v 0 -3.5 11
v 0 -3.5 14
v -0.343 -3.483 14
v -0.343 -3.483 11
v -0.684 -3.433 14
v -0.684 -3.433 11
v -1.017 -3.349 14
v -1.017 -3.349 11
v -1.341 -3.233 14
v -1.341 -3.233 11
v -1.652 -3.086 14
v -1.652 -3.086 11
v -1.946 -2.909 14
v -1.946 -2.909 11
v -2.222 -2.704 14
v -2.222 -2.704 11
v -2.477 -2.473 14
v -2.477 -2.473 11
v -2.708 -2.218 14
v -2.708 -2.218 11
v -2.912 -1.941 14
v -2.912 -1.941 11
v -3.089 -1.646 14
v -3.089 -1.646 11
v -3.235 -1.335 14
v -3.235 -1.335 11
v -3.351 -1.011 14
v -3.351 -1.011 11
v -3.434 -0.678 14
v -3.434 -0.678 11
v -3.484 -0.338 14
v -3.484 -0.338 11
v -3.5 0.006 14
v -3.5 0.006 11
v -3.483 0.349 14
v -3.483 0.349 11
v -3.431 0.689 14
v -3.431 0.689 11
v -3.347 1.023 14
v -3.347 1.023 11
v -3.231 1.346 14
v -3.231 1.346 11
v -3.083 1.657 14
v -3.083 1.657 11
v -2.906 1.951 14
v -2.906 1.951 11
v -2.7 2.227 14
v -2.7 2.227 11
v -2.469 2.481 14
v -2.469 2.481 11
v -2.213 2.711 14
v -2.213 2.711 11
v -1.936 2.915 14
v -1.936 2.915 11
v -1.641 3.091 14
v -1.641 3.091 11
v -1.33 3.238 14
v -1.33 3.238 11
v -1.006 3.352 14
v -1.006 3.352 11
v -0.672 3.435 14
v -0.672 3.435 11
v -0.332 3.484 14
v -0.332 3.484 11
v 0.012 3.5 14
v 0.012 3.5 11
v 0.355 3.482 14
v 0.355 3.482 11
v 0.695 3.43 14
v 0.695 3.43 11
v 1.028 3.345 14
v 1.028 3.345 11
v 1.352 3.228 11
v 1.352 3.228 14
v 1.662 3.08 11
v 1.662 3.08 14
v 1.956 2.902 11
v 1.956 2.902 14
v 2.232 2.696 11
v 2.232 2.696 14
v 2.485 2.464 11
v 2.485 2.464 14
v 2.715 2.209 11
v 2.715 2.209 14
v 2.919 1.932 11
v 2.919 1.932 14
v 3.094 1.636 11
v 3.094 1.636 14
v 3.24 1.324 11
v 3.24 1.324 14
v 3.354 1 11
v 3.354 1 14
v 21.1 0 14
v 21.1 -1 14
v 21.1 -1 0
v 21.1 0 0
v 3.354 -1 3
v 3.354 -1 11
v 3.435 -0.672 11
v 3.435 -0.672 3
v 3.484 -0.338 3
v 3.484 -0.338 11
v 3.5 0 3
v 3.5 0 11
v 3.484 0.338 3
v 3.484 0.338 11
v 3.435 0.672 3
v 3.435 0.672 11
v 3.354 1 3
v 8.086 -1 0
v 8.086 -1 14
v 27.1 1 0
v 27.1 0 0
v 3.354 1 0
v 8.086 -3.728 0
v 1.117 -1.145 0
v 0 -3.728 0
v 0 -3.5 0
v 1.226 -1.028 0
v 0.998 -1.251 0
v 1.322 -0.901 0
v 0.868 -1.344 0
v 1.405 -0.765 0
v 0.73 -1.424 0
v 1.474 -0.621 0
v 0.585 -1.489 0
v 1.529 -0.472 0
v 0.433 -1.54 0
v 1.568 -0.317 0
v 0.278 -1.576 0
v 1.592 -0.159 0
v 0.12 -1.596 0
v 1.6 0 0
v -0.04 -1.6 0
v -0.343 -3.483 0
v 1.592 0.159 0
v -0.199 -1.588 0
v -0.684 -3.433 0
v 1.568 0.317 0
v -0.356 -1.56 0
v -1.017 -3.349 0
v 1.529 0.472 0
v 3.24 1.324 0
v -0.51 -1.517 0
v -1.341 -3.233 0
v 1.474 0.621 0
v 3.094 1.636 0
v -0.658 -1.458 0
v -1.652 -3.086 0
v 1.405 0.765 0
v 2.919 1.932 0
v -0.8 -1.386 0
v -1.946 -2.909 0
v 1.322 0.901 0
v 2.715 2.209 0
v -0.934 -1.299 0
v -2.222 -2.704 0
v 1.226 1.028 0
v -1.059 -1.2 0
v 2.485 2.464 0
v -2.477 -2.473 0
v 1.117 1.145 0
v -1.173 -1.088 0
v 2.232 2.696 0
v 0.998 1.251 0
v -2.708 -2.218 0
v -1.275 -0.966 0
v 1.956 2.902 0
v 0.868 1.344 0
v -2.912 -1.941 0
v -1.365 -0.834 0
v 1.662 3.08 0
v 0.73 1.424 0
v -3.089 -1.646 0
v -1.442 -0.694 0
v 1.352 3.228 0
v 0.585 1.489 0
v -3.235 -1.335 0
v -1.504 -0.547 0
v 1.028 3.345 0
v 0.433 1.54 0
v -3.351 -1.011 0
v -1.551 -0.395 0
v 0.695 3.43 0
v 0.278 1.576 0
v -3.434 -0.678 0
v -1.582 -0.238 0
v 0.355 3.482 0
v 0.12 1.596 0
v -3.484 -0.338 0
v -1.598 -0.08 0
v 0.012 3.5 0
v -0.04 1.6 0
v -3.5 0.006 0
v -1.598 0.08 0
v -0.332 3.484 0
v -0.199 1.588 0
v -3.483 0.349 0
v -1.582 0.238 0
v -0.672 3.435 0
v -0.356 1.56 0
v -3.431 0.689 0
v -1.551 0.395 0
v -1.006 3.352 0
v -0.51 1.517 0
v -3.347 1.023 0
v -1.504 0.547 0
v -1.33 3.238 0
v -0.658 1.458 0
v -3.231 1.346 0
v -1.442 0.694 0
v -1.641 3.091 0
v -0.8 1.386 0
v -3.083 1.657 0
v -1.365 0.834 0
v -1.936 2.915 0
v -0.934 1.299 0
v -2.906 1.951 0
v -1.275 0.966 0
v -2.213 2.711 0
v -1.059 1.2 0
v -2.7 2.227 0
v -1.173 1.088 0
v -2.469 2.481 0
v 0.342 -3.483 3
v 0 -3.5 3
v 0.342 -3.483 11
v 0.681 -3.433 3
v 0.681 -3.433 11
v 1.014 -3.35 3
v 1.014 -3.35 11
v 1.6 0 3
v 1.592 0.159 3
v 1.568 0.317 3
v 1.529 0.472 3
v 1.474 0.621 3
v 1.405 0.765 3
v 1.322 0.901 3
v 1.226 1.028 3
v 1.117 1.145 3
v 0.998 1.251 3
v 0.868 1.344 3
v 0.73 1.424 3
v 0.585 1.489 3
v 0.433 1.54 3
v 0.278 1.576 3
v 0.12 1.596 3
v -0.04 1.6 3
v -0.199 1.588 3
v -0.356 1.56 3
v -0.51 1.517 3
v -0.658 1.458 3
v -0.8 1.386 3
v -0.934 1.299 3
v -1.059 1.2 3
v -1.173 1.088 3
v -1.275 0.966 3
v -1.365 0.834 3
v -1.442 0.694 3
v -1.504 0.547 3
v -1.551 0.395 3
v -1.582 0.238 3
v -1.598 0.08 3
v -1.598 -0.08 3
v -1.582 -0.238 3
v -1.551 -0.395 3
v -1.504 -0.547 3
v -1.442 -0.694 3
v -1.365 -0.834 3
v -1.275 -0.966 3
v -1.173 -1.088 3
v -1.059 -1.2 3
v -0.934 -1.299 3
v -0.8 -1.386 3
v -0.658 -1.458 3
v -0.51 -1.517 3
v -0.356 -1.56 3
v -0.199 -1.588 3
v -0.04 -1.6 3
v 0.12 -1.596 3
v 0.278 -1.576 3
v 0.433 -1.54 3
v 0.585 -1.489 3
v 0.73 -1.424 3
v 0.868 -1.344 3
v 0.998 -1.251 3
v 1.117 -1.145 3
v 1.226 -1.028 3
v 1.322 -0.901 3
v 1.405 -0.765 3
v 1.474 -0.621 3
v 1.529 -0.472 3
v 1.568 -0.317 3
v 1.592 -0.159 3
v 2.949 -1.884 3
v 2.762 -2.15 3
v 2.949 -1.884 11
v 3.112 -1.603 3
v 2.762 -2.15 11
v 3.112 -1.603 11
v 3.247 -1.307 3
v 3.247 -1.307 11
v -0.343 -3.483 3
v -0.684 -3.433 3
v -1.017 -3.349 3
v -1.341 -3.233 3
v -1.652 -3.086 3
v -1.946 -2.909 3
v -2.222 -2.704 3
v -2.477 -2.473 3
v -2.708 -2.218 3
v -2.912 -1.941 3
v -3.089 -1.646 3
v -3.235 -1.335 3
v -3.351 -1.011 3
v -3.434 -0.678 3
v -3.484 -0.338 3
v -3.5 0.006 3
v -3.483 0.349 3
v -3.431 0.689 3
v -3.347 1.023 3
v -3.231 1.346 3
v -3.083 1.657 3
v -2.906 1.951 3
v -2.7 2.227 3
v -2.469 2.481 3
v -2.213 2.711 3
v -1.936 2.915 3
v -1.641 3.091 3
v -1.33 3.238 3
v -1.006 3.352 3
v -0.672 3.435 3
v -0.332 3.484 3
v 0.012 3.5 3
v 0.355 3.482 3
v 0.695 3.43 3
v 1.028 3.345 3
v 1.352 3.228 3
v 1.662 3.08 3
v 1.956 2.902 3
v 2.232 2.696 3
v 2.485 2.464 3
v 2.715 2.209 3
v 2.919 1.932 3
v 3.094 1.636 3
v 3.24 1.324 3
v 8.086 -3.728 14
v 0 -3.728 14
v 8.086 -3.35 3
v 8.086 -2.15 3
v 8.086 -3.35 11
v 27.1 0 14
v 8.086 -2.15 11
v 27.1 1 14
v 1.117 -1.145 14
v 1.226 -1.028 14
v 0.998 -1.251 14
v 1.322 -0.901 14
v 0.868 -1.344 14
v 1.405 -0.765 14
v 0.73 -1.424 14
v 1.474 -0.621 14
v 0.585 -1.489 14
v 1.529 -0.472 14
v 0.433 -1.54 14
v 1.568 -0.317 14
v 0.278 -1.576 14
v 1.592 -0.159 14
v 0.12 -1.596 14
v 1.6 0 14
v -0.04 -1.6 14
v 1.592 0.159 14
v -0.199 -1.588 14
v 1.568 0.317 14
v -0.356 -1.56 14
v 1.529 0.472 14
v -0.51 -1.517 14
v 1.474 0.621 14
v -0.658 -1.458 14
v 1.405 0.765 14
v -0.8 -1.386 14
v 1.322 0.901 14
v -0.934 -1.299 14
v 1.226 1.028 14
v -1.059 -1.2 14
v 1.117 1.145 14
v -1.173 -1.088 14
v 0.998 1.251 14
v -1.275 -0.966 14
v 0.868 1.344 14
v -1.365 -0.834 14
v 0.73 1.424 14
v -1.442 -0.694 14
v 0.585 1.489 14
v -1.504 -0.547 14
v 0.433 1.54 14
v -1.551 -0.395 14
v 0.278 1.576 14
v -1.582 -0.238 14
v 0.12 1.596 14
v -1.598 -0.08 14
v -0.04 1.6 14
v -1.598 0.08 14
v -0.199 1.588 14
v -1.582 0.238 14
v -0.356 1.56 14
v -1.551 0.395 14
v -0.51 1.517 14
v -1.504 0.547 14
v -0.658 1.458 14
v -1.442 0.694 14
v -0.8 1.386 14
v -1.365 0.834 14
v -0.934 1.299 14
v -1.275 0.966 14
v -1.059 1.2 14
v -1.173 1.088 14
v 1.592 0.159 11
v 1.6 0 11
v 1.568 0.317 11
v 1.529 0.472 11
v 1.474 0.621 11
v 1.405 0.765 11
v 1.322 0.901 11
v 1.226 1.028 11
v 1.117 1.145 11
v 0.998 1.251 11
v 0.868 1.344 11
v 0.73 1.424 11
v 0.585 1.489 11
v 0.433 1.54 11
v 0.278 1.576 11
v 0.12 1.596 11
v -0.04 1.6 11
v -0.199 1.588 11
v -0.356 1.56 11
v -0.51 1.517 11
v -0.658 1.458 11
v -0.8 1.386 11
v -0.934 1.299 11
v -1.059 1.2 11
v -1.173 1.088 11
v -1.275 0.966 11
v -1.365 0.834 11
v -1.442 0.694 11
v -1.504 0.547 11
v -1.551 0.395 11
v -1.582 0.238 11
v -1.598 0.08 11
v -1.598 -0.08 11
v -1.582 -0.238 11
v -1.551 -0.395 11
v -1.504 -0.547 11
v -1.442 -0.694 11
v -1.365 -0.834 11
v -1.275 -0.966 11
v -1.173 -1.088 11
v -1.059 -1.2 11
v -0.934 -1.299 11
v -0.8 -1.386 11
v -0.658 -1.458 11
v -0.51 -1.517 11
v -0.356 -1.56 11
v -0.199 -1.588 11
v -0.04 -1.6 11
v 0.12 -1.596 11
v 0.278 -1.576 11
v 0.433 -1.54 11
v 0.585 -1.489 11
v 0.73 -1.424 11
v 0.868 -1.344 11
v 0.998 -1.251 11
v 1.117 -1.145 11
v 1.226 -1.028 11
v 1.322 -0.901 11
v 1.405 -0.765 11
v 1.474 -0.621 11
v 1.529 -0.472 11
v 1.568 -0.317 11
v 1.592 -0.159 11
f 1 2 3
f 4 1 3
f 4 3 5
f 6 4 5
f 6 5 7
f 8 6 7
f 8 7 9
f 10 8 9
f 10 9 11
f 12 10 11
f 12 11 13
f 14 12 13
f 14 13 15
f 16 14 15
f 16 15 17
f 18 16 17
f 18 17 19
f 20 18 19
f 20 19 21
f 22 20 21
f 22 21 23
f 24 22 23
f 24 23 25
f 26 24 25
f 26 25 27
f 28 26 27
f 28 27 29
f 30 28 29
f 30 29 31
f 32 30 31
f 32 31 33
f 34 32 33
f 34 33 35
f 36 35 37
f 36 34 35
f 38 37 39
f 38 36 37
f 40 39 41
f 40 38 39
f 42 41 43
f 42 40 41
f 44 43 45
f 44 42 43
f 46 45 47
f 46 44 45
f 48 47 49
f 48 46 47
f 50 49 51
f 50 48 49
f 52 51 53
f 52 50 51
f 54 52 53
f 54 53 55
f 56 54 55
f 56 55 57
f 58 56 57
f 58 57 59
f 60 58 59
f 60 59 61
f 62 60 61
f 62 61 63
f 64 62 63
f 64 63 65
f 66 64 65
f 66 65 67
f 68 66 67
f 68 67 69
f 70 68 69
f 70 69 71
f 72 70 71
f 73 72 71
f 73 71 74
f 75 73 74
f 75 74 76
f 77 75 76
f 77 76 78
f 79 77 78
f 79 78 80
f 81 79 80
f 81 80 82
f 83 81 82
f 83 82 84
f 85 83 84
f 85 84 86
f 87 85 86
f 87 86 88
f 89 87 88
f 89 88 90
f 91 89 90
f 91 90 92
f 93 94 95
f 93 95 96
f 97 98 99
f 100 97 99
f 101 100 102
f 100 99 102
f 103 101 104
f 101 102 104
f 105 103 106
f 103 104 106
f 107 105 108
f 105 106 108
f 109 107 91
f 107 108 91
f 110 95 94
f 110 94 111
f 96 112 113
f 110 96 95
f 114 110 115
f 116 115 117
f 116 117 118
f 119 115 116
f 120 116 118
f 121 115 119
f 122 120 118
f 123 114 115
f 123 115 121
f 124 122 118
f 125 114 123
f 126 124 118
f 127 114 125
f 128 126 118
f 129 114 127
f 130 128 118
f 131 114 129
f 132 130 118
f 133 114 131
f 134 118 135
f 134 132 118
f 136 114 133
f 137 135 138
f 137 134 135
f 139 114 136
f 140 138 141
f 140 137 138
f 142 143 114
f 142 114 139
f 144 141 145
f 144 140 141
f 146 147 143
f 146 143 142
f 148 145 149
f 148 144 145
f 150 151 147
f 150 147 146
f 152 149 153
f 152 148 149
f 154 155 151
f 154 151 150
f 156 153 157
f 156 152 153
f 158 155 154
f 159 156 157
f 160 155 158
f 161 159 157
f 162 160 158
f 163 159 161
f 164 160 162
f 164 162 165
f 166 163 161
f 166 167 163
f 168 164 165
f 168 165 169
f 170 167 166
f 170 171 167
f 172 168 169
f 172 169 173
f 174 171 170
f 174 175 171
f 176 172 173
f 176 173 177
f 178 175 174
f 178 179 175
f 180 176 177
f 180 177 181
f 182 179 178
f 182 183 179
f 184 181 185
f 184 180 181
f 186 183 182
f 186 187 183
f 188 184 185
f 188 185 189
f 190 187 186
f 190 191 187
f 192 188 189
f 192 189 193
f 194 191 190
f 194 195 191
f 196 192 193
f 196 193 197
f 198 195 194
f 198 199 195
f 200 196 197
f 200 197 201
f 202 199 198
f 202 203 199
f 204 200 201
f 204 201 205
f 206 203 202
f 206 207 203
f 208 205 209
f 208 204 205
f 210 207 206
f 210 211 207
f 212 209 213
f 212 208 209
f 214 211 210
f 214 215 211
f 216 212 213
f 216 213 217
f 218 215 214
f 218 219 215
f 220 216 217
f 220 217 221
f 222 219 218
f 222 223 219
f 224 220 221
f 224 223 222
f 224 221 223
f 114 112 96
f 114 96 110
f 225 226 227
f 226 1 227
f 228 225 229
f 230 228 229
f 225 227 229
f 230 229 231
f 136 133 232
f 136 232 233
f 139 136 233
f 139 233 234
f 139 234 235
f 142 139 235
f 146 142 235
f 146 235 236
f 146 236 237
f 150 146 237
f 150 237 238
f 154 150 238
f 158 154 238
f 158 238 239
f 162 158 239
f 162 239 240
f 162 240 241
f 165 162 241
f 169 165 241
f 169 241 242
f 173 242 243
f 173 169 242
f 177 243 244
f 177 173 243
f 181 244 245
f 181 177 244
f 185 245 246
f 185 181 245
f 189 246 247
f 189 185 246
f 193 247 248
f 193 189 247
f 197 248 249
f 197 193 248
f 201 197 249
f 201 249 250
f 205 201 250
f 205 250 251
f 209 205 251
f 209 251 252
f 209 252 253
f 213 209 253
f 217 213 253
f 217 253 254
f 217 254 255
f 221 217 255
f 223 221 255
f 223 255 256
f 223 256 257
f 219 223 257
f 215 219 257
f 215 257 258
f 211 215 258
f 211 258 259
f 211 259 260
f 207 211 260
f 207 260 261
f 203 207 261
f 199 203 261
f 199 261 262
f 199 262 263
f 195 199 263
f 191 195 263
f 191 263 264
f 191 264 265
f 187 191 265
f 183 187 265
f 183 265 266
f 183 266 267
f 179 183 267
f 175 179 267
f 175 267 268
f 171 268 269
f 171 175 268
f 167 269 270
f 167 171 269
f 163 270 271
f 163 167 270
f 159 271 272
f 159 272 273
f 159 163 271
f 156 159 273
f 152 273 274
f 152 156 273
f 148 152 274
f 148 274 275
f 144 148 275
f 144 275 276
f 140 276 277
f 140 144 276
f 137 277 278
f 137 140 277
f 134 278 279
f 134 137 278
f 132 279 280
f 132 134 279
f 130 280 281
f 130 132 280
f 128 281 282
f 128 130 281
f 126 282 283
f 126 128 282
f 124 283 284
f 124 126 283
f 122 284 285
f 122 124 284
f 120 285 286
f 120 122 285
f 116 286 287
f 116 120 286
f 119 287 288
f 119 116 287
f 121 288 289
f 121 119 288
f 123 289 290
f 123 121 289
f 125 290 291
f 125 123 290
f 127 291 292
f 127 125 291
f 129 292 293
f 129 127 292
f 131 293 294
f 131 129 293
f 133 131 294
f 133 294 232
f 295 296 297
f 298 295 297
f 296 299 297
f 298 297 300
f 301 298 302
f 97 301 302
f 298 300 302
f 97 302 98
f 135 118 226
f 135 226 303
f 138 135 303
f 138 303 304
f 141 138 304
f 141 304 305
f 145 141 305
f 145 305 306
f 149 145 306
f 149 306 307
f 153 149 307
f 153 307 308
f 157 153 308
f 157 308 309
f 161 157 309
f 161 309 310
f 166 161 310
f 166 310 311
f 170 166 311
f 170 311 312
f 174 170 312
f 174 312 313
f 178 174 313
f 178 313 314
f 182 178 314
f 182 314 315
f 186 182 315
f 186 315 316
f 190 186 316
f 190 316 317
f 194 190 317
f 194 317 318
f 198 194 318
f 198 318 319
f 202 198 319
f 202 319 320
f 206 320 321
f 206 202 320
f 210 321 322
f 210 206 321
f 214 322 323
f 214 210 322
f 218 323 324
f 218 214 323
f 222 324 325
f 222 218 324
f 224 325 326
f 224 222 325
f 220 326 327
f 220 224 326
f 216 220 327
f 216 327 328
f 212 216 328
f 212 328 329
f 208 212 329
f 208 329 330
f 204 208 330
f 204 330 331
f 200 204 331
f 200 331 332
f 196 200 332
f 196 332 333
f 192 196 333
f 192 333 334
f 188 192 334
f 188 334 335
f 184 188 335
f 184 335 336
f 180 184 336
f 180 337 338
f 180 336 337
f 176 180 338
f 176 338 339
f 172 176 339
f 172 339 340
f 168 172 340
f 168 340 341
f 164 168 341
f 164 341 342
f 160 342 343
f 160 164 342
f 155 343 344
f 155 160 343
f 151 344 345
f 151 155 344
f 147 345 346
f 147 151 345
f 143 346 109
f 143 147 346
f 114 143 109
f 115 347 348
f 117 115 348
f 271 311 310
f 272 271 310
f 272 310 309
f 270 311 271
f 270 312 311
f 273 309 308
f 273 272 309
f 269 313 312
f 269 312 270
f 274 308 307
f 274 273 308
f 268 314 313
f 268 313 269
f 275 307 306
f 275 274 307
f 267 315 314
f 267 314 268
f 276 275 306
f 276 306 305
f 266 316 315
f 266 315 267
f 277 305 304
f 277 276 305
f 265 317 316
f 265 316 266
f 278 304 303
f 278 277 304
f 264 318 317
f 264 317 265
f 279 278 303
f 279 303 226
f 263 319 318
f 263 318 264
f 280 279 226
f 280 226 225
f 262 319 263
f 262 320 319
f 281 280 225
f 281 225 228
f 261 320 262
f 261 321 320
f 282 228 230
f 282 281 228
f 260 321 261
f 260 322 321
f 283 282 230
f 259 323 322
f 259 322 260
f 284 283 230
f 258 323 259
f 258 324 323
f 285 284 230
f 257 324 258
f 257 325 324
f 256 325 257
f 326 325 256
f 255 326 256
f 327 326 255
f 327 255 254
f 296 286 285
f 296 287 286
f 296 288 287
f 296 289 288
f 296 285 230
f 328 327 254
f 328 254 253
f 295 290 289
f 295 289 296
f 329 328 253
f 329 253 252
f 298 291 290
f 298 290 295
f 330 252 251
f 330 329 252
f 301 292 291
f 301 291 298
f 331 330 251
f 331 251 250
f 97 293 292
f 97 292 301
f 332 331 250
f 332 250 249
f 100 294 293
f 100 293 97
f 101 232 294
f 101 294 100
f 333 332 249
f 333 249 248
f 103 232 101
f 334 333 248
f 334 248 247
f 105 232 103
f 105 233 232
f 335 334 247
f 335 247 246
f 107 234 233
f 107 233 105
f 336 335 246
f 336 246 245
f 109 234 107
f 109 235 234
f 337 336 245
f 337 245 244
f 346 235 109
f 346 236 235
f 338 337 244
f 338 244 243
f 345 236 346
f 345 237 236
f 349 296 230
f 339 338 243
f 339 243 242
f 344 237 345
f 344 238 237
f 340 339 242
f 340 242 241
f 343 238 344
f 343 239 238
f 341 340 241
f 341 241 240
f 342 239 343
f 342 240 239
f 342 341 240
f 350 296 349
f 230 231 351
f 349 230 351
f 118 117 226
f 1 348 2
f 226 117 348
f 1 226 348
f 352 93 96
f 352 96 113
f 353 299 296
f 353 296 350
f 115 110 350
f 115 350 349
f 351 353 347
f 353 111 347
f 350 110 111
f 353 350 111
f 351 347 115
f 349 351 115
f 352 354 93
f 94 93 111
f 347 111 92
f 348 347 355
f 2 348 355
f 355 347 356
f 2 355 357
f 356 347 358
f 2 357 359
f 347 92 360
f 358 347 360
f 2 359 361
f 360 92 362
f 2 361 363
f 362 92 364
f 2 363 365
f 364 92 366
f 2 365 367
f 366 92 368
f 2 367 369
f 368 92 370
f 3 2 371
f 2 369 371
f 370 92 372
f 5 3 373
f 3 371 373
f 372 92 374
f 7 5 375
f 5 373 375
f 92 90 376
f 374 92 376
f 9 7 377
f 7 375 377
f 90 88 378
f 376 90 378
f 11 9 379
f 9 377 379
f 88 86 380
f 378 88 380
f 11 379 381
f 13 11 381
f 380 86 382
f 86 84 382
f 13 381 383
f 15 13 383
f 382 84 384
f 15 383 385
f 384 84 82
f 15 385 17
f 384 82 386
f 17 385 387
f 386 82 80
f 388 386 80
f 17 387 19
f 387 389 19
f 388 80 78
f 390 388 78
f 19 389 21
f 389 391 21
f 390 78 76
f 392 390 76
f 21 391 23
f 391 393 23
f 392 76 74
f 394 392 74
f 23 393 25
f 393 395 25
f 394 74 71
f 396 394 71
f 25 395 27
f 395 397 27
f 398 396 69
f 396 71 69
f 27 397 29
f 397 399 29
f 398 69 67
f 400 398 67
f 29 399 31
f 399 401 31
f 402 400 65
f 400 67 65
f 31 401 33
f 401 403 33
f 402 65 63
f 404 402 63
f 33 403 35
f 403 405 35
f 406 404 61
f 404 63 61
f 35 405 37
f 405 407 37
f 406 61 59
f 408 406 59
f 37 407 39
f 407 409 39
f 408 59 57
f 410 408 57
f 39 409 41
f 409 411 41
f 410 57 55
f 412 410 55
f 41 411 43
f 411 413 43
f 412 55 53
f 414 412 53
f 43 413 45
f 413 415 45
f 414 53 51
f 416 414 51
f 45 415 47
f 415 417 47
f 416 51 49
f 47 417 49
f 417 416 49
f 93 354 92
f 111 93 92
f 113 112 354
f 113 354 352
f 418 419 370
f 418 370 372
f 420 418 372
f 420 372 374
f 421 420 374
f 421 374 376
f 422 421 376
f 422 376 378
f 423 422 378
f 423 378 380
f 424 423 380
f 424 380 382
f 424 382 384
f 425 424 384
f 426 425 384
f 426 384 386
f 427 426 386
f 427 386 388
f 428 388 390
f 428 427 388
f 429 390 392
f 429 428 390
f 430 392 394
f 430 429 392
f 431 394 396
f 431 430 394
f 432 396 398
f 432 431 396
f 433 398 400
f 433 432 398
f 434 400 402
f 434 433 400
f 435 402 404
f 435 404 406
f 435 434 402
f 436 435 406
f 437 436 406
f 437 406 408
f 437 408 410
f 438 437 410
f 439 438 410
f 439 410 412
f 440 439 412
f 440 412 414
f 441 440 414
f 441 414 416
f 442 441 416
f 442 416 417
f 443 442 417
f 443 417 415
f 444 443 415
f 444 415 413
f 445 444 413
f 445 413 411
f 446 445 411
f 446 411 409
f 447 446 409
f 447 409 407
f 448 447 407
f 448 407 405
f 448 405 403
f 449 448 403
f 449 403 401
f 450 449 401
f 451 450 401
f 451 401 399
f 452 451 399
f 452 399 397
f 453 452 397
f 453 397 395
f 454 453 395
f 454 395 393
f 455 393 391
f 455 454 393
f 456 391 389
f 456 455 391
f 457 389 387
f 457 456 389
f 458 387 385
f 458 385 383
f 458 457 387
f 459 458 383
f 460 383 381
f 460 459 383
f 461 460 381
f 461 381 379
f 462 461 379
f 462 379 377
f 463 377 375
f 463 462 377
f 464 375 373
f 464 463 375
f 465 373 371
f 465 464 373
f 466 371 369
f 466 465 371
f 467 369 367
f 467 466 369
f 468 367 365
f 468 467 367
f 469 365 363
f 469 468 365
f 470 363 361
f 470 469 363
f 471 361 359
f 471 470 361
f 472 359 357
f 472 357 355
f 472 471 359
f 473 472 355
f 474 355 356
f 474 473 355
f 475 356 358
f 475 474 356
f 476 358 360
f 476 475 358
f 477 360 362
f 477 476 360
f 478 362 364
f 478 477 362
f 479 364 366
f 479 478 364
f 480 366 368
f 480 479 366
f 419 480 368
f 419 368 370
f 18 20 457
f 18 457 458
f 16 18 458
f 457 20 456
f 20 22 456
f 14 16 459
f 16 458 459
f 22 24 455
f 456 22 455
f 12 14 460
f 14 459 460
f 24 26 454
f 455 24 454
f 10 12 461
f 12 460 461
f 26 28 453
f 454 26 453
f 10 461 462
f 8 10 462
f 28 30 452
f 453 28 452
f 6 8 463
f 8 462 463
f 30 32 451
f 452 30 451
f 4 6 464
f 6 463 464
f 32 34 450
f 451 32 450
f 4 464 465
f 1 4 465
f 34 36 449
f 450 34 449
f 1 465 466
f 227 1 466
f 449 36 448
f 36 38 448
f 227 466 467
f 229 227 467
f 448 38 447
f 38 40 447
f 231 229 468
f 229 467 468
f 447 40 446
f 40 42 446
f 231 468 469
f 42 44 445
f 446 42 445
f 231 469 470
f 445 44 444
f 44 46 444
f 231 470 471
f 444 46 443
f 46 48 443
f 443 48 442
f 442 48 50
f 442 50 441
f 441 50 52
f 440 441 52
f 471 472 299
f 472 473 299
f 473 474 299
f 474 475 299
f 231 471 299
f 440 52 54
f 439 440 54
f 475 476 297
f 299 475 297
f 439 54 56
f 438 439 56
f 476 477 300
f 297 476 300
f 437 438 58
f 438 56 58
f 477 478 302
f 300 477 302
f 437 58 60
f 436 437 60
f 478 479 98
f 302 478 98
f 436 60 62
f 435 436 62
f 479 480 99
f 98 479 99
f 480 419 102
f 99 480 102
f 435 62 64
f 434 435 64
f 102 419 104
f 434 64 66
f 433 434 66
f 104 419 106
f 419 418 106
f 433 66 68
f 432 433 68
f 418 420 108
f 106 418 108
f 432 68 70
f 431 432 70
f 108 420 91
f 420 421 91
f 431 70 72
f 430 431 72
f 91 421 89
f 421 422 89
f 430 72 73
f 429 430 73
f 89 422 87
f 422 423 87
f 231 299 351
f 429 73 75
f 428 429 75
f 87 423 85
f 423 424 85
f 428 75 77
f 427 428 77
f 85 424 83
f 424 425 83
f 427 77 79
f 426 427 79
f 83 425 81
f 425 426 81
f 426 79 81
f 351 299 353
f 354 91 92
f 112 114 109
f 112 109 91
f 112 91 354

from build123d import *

# Parameters (mm, degrees)
SKETCH_1_R          = 1.6
EXTRUDE_1_DEPTH     = 14
SKETCH_2_W          = 6
SKETCH_2_H          = 1
CUT_EXTRUDE_1_DEPTH = 14
SKETCH_3_R          = 3.5
SKETCH_3_R_2        = 1.6
CUT_EXTRUDE_2_DEPTH = 4
EXTRUDE_2_REACH     = 32.703
SKETCH_9_W          = 7.421187745
SKETCH_9_H          = 1.2
CUT_EXTRUDE_4_DEPTH = 8


with BuildPart() as part:
    # 草图1 → 凸台-拉伸1 (new body)
    with BuildSketch(Plane.XY):
        with BuildLine():
            Line((3.354101966, 1), (27.1, 1))
            Line((27.1, 1), (27.1, -1))
            Line((27.1, -1), (3.354101966, -1))
            ThreePointArc((3.354101966, -1), (-3.5, 0), (3.354101966, 1))
        make_face()
        Circle(SKETCH_1_R, mode=Mode.SUBTRACT)
    extrude(amount=EXTRUDE_1_DEPTH)

    # 草图2 → 切除-拉伸1 (cut)
    with BuildSketch(Plane.XY.offset(14)):
        with Locations((24.1, -0.5)):
            Rectangle(SKETCH_2_W, SKETCH_2_H)
    extrude(amount=-CUT_EXTRUDE_1_DEPTH, mode=Mode.SUBTRACT)

    # 草图3 → 切除-拉伸2 (cut, symmetric)
    with BuildSketch(Plane.XY.offset(7)):
        Circle(SKETCH_3_R)
        Circle(SKETCH_3_R_2, mode=Mode.SUBTRACT)
    extrude(amount=CUT_EXTRUDE_2_DEPTH, both=True, mode=Mode.SUBTRACT)

    # 凸台-拉伸2: up to this face of the body (flat: up to its plane)
    extrude_2_end = Plane(part.part.faces().sort_by_distance((8.055556707, 0.041818565, 0))[0])
    # 草图6 → 凸台-拉伸2 (add, up to the picked face)
    with BuildSketch(Plane.XY.offset(14), mode=Mode.PRIVATE) as extrude_2_sk1:
        with BuildLine():
            Line((8.085544375, -2.1), (8.085544375, -3.4))
            Line((8.085544375, -3.4), (8.085544375, -3.5))
            Line((8.085544375, -3.5), (8.085544375, -3.728060251))
            Line((8.085544375, -3.728060251), (0, -3.728060251))
            Line((0, -3.728060251), (0, -3.5))
            ThreePointArc((0, -3.5), (2.091650066, -2.80624304), (3.354101966, -1))
            Line((3.354101966, -1), (8.085544375, -1))
            Line((8.085544375, -1), (8.085544375, -2.1))
        make_face()
    extrude_2_tool1 = split(extrude(extrude_2_sk1.sketch, amount=-EXTRUDE_2_REACH, mode=Mode.PRIVATE), bisect_by=extrude_2_end, keep=Keep.BOTH, mode=Mode.PRIVATE)
    add(extrude_2_tool1.solids().sort_by(Axis((5.088052, -2.490325, 14), (0, 0, -1)))[0])

    # 草图9 → 切除-拉伸4 (cut)
    with BuildSketch(Plane.XY.offset(11)):
        with Locations((4.374950503, -2.75)):
            Rectangle(SKETCH_9_W, SKETCH_9_H)
    extrude(amount=-CUT_EXTRUDE_4_DEPTH, mode=Mode.SUBTRACT)


solid = part.part
